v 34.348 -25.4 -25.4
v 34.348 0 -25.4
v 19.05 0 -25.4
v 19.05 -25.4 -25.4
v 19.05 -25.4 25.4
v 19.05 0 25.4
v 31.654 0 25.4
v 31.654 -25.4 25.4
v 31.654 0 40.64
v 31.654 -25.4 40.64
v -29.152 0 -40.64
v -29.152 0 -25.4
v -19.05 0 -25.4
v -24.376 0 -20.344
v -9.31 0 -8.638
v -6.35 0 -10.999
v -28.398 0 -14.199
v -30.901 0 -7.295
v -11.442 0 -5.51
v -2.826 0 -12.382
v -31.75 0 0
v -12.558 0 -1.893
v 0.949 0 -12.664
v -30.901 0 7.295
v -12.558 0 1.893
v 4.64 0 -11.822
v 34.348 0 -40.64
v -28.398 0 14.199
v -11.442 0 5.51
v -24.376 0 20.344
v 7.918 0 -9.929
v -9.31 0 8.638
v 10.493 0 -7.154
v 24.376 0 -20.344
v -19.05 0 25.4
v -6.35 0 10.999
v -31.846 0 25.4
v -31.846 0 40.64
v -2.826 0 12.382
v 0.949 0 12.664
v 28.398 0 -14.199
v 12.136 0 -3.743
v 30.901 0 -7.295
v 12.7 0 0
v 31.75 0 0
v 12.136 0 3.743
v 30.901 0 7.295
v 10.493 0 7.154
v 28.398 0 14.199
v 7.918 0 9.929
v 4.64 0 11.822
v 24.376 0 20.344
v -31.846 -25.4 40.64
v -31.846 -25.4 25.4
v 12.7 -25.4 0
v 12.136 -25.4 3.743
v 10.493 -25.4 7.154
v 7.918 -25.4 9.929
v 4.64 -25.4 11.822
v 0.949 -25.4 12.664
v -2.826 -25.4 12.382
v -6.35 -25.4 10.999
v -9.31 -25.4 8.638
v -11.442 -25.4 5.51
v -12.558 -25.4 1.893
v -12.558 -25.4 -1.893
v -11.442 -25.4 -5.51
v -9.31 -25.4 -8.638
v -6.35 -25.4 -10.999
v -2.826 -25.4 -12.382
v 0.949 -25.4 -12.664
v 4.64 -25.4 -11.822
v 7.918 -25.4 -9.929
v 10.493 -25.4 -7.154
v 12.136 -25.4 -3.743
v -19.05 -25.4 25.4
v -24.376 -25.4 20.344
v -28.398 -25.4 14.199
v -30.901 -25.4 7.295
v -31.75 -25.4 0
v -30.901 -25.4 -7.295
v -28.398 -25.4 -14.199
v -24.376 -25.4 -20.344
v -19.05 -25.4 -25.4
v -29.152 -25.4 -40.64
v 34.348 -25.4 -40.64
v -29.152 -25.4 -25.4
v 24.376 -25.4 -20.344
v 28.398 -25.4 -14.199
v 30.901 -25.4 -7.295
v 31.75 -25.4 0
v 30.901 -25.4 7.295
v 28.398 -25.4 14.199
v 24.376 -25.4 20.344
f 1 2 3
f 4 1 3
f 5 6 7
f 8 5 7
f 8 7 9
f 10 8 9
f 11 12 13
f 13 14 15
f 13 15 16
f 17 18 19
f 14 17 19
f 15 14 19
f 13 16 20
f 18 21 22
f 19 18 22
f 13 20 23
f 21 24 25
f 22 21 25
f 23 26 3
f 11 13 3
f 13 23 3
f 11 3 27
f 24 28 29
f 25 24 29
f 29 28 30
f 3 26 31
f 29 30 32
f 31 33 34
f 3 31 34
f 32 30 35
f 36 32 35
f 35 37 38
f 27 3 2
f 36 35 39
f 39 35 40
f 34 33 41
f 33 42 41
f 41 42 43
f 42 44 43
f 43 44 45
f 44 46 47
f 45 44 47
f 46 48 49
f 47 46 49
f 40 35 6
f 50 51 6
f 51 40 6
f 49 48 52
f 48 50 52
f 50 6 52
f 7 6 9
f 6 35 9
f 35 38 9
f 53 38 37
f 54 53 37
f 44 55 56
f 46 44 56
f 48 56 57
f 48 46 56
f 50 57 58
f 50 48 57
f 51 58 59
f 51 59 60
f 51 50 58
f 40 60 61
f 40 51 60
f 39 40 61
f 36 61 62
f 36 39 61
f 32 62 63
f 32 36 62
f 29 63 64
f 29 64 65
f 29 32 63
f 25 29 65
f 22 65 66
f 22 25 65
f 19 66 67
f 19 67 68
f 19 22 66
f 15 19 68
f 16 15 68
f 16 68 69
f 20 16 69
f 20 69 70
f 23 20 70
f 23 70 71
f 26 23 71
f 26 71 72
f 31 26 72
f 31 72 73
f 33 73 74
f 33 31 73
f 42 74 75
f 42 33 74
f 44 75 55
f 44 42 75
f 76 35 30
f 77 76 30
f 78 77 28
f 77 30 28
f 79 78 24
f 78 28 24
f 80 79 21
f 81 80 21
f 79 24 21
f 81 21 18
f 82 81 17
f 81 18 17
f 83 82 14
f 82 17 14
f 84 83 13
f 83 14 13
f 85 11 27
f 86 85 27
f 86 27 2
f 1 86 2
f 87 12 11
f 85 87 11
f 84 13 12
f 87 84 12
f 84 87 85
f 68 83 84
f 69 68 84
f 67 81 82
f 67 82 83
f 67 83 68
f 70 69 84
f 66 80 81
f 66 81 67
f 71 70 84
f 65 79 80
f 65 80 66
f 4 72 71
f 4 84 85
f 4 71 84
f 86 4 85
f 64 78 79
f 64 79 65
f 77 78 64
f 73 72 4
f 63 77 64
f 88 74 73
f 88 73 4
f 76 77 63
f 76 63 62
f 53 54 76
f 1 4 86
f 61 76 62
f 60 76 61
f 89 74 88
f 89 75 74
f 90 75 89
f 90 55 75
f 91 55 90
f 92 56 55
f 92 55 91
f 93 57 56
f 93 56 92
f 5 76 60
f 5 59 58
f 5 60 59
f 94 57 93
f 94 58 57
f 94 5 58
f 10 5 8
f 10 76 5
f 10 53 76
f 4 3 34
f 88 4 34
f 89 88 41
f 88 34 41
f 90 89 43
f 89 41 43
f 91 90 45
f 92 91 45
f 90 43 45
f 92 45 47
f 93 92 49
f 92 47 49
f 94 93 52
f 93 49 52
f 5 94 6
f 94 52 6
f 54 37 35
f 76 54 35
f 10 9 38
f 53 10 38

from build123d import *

# Parameters (mm, degrees)
F0_R     = 12.7
F1_DEPTH = 25.4


with BuildPart() as f1:
    # F0 (on Front) → F1 (new body)
    with BuildSketch(Plane.XZ):
        with BuildLine():
            Line((-31.846212, 25.4), (-19.05, 25.4))
            ThreePointArc((-19.05, 25.4), (-31.75, 0), (-19.05, -25.4))
            Line((-19.05, -25.4), (-29.152272, -25.4))
            Line((-29.152272, -25.4), (-29.152272, -40.64))
            Line((-29.152272, -40.64), (34.347728, -40.64))
            Line((34.347728, -40.64), (34.347728, -25.4))
            Line((34.347728, -25.4), (19.05, -25.4))
            ThreePointArc((19.05, -25.4), (31.75, 0), (19.05, 25.4))
            Line((19.05, 25.4), (31.653788, 25.4))
            Line((31.653788, 25.4), (31.653788, 40.64))
            Line((31.653788, 40.64), (-31.846212, 40.64))
            Line((-31.846212, 40.64), (-31.846212, 25.4))
        make_face()
        Circle(F0_R, mode=Mode.SUBTRACT)
    extrude(amount=F1_DEPTH)


solid = f1.part
